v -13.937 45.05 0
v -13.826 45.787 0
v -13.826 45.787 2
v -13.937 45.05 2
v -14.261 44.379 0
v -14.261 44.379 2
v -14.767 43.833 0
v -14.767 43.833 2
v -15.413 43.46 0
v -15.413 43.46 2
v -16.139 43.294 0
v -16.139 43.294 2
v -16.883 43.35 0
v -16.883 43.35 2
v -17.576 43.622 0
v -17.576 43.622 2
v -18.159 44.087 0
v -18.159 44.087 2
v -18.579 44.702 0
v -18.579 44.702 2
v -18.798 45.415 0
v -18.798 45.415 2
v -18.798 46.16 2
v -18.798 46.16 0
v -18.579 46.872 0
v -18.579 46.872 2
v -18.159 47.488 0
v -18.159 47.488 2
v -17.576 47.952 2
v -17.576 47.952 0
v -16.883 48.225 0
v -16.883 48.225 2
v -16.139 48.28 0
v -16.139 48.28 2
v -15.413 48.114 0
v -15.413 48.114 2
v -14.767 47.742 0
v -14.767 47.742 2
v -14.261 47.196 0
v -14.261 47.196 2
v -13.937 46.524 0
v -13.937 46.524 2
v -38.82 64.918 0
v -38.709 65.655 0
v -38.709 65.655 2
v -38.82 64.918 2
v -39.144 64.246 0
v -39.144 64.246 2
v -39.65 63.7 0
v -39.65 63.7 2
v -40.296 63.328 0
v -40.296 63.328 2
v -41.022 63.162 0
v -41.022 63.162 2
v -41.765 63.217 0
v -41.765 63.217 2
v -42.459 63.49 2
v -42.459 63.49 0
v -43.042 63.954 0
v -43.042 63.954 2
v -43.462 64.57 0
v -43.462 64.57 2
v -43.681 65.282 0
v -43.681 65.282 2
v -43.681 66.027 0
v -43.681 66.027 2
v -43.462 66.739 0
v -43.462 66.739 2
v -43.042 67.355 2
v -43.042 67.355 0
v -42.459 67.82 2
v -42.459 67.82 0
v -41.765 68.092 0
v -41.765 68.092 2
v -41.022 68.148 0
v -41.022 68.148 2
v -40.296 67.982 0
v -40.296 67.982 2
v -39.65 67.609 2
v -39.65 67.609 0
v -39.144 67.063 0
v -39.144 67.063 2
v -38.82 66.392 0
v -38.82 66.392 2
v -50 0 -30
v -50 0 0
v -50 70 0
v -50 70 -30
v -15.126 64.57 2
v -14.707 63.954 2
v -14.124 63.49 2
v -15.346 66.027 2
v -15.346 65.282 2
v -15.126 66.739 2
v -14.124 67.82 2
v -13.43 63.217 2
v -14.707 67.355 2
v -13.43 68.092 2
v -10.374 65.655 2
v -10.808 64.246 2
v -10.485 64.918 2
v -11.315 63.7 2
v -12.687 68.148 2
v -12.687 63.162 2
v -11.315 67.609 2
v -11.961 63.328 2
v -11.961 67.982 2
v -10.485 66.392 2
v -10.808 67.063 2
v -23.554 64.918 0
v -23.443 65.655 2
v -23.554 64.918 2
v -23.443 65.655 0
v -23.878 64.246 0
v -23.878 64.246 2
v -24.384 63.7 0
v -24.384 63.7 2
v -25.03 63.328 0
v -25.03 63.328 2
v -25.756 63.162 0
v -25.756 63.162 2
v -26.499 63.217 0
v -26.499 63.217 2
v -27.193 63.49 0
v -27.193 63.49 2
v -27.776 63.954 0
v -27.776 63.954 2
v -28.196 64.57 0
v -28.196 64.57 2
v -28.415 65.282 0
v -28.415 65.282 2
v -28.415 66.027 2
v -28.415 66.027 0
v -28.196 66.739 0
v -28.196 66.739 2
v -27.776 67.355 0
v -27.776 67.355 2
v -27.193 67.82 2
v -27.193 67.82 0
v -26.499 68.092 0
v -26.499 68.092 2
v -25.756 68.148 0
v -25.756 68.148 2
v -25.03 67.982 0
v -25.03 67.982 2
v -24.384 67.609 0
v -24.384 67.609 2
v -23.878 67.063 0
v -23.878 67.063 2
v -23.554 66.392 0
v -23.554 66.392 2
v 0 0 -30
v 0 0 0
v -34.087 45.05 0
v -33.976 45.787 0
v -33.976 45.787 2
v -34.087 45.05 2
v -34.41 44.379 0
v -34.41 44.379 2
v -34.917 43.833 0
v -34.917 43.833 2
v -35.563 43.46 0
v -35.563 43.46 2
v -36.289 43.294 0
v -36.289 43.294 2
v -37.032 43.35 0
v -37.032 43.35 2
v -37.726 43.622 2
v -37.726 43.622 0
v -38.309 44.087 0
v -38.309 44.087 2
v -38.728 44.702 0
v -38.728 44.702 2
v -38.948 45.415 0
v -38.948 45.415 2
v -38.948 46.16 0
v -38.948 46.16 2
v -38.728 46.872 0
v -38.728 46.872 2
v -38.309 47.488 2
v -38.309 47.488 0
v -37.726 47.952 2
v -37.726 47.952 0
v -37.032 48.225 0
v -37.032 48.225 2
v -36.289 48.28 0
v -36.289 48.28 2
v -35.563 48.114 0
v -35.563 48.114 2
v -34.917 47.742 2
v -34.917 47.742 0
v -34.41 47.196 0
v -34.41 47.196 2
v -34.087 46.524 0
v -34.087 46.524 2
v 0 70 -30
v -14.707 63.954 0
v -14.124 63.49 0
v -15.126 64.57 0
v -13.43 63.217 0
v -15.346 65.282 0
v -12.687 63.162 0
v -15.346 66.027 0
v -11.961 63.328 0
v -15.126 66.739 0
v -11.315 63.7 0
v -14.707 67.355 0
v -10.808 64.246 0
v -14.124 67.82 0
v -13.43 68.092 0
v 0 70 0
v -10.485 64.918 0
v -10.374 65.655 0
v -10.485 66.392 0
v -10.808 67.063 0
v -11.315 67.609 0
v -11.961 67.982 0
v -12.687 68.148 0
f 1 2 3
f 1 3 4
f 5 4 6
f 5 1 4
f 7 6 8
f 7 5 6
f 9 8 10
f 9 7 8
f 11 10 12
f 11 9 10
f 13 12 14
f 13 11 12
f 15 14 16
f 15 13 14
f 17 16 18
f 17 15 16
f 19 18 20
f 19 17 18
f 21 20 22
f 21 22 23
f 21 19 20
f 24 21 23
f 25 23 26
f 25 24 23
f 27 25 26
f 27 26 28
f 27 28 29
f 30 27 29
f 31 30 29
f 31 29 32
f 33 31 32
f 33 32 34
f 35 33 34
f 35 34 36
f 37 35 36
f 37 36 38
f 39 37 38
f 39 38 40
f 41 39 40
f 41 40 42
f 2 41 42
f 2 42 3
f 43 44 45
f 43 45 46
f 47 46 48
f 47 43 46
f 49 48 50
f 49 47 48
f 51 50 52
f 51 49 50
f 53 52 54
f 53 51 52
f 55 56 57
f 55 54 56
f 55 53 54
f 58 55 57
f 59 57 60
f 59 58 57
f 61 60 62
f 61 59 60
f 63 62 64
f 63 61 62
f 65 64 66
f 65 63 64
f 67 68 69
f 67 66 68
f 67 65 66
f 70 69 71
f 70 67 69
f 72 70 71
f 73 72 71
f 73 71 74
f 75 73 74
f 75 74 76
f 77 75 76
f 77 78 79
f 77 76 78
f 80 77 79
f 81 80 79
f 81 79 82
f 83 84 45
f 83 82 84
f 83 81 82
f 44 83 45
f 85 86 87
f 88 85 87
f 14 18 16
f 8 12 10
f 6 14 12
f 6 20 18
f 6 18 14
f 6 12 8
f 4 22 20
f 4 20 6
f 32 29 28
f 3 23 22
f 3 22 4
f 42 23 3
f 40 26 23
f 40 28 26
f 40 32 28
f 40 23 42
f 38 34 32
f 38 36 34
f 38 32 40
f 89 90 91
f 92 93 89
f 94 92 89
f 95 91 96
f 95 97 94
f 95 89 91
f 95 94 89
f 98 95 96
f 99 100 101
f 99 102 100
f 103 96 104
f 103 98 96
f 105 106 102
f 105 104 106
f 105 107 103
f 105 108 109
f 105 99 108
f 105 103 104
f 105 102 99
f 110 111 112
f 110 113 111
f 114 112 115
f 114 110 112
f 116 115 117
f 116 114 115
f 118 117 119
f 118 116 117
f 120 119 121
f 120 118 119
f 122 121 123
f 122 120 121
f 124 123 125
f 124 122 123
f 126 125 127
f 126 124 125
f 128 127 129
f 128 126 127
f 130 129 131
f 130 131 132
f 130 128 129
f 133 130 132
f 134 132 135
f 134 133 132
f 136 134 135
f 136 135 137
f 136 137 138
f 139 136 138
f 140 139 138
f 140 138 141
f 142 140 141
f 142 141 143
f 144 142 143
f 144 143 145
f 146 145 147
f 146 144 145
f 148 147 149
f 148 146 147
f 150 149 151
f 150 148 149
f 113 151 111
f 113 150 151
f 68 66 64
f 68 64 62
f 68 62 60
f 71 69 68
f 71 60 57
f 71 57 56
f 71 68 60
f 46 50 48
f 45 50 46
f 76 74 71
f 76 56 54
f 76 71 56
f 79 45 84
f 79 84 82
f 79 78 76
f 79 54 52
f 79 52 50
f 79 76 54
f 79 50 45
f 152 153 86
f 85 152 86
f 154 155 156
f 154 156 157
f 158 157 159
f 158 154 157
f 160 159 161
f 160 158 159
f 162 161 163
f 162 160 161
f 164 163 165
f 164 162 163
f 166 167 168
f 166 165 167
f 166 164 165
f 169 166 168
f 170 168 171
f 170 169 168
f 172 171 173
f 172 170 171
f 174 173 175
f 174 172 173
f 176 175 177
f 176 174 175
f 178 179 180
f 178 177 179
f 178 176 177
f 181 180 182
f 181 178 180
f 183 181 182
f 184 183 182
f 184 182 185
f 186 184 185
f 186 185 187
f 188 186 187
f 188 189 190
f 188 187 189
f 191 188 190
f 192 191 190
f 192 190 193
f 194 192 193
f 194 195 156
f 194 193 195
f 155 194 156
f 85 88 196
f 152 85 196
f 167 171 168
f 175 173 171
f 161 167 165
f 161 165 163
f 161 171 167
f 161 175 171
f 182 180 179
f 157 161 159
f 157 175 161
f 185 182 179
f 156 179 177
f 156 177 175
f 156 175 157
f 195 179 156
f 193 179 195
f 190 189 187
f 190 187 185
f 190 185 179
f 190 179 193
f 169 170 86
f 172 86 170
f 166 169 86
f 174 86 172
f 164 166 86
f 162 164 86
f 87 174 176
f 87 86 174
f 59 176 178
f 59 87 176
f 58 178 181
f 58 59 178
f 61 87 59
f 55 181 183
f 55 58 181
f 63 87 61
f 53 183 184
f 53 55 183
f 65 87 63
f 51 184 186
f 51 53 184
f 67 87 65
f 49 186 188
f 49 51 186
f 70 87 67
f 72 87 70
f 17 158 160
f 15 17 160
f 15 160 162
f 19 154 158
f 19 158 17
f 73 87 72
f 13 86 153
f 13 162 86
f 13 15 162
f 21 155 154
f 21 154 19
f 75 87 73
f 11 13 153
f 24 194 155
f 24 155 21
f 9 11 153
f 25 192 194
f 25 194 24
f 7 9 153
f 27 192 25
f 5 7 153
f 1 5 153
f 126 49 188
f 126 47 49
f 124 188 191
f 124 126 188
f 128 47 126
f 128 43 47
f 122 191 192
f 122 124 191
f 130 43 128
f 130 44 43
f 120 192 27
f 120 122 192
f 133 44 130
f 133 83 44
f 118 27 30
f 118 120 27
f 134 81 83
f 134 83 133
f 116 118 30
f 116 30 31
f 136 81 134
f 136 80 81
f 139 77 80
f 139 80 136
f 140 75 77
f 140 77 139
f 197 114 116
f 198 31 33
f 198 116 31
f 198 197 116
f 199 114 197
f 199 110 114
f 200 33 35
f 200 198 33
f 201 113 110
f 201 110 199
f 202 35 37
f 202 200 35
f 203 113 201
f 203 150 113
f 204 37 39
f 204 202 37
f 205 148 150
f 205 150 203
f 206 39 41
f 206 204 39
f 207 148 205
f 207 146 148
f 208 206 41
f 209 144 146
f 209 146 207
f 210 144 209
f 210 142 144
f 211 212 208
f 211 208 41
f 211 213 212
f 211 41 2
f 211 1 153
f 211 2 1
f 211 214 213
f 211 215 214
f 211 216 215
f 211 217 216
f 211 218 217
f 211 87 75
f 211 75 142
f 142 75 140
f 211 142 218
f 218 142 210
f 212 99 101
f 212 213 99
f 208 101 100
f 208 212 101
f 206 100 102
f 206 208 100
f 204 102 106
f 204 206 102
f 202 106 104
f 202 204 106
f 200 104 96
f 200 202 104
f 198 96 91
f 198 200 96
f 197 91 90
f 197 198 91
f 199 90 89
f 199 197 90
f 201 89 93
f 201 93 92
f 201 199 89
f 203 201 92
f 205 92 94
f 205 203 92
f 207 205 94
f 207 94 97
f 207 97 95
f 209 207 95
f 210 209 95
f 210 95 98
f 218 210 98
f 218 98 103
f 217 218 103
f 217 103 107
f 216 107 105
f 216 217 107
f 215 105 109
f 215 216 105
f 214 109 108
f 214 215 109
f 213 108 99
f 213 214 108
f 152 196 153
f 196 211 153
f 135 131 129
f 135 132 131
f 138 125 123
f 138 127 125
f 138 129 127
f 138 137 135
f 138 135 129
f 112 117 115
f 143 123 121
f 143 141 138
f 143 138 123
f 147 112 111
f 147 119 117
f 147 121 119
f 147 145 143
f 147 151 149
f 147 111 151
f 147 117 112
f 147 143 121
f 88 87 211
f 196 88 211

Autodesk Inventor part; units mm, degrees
ref_plane "YZ Plane" through (0, 0, 0) normal (1, 0, 0) x (0, 1, 0)
ref_plane "XZ Plane" through (0, 0, 0) normal (0, 1, 0) x (-1, 0, 0)
ref_plane "XY Plane" through (0, 0, 0) normal (0, 0, 1) x (1, 0, 0)
sketch "Sketch1" plane through (0, 0, 0) normal (0, 0, 1) x (1, 0, 0)
  line L0 (0, 0) -> (-50, 0)
  line L1 (-50, 0) -> (-50, 70)
  line L2 (-50, 70) -> (0, 70)
  line L3 (0, 70) -> (0, 0)
  dimension "d0" = 50
  dimension "d1" = 70
extrude "Extrusion1" add sketch "Sketch1" against normal blind 30
sketch "Sketch2" plane through (0, 0, 0) normal (0, 0, 1) x (1, 0, 0)
  circle A0 centre (-41.2091, 65.6547) radius 2.5
  line L0 (-41.2091, 65.6547) -> (-12.3103, 65.6547)
  circle A1 centre (-25.9431, 65.6547) radius 2.5
  circle A2 centre (-12.8739, 65.6547) radius 2.5
  circle A3 centre (-36.4759, 45.7872) radius 2.5
  line L1 (-36.4759, 45.7872) -> (-11.1478, 45.7872)
  circle A4 centre (-16.3262, 45.7872) radius 2.5
  point P0 (0, 0)
  dimension "d4" = 5
  dimension "d5" = 5
  dimension "d6" = 5
  dimension "d7" = 5
  dimension "d8" = 5
extrude "Extrusion2" add sketch "Sketch2" along normal blind 2
properties part number "subsystem1"
